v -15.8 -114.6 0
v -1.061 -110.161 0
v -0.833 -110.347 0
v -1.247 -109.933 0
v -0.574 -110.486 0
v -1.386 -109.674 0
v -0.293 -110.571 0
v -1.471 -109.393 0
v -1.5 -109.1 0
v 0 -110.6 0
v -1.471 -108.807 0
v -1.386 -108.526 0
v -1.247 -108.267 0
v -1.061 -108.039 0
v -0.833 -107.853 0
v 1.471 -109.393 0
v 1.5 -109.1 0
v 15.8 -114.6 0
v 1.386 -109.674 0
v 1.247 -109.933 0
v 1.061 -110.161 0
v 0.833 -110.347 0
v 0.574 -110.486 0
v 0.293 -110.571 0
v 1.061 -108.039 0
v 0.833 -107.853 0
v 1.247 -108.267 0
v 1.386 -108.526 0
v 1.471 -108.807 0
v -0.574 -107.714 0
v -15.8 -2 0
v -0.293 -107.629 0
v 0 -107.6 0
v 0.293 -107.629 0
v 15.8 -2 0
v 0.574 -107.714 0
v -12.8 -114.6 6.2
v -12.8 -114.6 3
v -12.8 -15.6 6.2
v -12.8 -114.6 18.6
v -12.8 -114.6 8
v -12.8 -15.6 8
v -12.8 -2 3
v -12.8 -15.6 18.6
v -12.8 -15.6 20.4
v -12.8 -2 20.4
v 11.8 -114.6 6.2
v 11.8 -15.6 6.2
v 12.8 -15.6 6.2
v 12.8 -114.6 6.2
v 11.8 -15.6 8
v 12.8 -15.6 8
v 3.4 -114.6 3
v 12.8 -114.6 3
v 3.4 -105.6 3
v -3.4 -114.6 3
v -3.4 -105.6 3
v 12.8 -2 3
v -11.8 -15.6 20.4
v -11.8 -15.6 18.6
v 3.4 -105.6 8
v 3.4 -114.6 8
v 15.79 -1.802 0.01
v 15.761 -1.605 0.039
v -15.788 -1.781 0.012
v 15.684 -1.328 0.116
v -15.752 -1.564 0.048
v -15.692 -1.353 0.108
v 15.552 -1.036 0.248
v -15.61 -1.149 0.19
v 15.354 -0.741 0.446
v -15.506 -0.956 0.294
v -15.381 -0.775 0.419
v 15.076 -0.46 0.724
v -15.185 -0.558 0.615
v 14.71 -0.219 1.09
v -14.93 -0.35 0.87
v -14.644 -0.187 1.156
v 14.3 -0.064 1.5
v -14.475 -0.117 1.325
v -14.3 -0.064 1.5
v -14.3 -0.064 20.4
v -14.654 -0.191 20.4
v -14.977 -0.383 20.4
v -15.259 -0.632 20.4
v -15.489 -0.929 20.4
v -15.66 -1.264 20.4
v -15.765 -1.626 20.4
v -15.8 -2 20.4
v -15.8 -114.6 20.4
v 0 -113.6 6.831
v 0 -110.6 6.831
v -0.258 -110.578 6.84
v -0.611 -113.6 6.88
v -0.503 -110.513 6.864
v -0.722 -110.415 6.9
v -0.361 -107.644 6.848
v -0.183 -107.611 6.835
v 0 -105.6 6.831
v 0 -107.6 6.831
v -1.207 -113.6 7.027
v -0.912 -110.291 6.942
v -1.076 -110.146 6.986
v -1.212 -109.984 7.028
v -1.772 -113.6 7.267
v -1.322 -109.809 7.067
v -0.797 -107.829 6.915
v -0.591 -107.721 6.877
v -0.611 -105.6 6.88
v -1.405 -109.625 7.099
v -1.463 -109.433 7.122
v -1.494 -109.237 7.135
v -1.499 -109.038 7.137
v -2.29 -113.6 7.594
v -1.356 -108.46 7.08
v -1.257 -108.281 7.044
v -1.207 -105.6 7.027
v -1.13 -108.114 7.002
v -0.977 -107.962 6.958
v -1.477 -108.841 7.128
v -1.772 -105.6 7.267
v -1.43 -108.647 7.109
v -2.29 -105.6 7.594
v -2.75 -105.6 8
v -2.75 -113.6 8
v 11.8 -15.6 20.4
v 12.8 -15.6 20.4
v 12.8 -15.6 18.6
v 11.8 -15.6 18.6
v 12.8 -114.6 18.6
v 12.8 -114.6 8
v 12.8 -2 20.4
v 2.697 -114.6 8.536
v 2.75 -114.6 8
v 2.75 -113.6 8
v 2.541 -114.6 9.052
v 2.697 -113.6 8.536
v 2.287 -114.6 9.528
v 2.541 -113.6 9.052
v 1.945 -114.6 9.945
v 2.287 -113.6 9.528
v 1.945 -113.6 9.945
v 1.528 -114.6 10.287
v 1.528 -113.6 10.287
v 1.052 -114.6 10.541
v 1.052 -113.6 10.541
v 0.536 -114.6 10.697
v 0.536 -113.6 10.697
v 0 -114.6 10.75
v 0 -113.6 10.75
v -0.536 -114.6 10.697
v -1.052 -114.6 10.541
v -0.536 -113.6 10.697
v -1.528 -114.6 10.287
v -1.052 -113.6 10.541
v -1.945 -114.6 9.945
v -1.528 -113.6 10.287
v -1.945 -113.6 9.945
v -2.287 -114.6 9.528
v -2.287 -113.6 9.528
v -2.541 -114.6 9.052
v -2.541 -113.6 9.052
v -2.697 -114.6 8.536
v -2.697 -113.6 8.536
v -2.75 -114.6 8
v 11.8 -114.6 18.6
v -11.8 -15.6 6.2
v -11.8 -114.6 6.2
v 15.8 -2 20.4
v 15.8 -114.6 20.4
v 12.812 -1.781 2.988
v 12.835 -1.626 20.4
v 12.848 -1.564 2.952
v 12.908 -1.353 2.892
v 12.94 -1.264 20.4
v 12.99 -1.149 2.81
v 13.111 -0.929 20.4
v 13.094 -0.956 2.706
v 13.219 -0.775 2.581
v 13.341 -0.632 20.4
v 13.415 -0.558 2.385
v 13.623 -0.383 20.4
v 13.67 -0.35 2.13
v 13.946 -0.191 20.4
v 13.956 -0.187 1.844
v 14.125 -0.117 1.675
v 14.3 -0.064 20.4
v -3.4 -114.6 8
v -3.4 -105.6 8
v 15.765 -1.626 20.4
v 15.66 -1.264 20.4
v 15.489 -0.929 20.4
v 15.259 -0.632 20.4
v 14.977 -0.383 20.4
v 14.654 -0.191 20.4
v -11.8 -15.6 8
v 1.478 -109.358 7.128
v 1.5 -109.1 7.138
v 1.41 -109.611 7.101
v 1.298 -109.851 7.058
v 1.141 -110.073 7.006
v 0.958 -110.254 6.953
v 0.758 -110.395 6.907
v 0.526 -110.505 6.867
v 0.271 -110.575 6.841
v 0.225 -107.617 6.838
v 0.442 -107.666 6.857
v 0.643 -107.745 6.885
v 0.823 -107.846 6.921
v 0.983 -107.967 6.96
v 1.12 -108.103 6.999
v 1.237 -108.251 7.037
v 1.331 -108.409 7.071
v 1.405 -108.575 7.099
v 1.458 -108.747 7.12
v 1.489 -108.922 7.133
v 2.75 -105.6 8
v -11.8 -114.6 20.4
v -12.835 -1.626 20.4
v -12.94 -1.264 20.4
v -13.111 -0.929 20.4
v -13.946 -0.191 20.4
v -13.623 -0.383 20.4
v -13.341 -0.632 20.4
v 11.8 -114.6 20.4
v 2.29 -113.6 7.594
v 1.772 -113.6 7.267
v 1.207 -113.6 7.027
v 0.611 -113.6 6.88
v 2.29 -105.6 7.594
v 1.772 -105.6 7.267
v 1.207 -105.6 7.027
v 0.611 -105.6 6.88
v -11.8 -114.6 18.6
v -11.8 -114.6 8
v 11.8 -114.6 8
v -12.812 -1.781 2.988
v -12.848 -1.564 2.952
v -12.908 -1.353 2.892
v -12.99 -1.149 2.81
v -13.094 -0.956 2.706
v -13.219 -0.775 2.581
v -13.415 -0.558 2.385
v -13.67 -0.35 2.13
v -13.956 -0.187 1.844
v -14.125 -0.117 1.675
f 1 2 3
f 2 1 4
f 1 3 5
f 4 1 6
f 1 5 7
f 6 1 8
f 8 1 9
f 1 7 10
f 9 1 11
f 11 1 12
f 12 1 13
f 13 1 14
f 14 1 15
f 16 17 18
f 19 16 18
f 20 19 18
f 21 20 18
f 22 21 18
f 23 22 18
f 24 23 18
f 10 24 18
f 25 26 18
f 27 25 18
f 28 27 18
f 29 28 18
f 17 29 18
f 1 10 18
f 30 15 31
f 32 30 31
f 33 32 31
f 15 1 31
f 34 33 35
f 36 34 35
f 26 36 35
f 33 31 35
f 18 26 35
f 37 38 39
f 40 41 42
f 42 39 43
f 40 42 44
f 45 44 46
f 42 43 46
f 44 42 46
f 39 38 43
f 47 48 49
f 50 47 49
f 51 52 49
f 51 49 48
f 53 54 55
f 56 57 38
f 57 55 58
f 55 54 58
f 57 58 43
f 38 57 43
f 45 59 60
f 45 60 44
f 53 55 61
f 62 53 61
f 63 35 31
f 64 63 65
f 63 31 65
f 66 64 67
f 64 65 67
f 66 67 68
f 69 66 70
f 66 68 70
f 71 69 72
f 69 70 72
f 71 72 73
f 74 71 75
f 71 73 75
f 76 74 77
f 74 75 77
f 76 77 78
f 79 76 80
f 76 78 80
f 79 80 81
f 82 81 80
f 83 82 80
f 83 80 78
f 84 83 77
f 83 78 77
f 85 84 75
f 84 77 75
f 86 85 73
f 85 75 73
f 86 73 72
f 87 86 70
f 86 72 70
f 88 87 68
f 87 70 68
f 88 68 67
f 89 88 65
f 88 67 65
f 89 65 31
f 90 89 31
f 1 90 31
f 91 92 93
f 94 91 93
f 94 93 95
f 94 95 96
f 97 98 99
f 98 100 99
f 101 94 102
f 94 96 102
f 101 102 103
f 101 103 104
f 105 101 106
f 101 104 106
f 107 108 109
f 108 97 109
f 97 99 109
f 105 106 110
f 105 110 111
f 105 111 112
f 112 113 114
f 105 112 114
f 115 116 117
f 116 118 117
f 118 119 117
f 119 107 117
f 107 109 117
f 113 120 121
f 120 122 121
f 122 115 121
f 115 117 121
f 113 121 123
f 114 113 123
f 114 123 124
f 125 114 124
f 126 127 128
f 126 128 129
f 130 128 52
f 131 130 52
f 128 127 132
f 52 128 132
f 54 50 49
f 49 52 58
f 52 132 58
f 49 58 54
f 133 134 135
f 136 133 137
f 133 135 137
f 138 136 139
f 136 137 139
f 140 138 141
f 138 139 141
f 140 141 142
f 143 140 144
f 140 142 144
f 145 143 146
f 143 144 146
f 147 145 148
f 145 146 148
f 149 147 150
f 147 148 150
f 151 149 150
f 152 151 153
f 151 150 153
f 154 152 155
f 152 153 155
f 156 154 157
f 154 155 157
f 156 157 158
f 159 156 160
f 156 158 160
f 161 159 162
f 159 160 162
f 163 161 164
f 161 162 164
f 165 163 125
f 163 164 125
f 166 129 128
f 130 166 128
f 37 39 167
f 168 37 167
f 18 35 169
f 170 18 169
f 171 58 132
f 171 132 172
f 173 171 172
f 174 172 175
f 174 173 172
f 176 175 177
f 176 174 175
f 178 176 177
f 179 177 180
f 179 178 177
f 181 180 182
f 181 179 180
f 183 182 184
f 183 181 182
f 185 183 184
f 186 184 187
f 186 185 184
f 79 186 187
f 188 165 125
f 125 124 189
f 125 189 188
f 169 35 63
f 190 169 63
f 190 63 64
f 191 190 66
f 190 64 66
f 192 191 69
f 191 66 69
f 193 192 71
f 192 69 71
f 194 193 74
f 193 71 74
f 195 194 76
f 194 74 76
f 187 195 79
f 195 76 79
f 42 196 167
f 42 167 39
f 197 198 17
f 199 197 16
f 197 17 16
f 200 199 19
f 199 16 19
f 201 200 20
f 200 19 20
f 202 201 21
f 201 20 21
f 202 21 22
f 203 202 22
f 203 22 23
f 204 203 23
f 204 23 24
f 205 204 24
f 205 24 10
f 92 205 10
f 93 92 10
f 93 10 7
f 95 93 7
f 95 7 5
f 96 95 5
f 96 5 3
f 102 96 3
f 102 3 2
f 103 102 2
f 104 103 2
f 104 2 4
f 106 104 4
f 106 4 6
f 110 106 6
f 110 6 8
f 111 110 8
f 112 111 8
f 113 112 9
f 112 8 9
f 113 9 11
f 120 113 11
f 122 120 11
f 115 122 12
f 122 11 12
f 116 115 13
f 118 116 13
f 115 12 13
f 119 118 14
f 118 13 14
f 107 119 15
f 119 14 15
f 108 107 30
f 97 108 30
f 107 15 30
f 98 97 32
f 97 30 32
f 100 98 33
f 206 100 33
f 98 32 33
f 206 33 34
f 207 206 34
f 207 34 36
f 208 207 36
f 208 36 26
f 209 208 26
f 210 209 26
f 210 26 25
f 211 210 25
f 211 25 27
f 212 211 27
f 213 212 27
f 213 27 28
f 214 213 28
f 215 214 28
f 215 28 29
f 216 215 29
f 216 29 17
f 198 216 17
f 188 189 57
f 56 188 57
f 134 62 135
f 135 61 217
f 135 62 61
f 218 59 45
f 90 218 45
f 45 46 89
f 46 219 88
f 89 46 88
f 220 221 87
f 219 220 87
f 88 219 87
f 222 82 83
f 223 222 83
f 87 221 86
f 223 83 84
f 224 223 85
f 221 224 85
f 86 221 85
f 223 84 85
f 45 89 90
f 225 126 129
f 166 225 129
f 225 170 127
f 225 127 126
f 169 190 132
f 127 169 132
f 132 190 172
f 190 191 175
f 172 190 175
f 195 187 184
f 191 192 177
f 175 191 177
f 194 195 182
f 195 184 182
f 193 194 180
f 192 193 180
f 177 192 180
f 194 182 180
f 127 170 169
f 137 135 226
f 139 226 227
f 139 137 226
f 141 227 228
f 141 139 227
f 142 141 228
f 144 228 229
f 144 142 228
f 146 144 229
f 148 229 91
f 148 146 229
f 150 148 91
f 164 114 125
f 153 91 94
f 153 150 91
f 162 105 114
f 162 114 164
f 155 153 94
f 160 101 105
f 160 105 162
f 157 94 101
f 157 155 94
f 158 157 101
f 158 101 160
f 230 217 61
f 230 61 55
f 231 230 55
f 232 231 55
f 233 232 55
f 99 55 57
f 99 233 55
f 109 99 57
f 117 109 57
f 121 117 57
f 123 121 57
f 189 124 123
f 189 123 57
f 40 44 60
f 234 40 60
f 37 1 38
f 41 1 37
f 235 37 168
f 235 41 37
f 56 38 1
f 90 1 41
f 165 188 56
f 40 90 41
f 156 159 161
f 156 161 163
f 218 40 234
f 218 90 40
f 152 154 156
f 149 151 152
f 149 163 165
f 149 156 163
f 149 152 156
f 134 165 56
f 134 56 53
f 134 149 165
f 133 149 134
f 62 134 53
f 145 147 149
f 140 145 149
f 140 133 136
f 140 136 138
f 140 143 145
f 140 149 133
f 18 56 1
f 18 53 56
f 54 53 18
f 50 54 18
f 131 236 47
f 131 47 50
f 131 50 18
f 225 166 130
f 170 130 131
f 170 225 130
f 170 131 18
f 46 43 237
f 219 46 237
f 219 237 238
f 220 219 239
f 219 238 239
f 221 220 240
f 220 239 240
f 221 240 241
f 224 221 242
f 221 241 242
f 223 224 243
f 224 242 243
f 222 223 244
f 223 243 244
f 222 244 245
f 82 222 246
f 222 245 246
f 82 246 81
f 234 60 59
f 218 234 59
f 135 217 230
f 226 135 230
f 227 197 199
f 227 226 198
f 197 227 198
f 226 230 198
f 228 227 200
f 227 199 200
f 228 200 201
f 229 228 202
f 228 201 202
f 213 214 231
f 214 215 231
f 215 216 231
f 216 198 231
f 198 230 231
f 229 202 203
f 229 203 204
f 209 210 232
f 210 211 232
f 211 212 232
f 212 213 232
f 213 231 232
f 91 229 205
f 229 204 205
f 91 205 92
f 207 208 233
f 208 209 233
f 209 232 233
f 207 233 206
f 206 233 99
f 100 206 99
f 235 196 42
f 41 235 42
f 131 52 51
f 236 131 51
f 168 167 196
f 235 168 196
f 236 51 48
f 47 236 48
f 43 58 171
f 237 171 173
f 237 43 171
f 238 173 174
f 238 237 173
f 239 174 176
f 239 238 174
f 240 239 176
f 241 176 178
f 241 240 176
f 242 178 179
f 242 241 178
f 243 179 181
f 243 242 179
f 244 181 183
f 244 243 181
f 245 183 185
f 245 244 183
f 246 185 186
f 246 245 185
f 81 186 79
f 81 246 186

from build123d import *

# Parameters (mm, degrees)
F1_DEPTH      = 114.6
F3_DEPTH      = 105.6
F5_DEPTH      = 8
F6_R          = 1.5
F7_DEPTH      = 20.401
F8_W          = 1
F8_H          = 1.8
F9_DEPTH      = 15.6
F10_T1_DEPTH  = 22.4
F10_T3_DEPTH  = 30.4
F10_T5_DEPTH  = 25.6
F10_T7_DEPTH  = 41.6
F10_T13_DEPTH = 30.6
F10_T17_DEPTH = 27.4
F10_T24_DEPTH = 30.6
F10_T28_DEPTH = 27.4


# Not quite as in the source:
# - a fillet or chamfer that OpenCascade refuses, or shapes differently, is made with other operations: its cross-section is extruded or revolved along the edge and cut away or added


with BuildPart() as f1:
    # F0 (on Front) → F1 (new body)
    with BuildSketch(Plane.XZ):
        Polygon((-15.8, 0), (0, 0), (15.8, 0), (15.8, 20.4), (11.8, 20.4), (11.8, 18.6), (12.8, 18.6), (12.8, 8), (11.8, 8), (11.8, 6.2), (12.8, 6.2), (12.8, 3), (3.4, 3), (3.4, 8), (2.75, 8), (0, 8), (-2.75, 8), (-3.4, 8), (-3.4, 3), (-12.8, 3), (-12.8, 6.2), (-11.8, 6.2), (-11.8, 8), (-12.8, 8), (-12.8, 18.6), (-11.8, 18.6), (-11.8, 20.4), (-15.8, 20.4), align=None)
        with BuildLine():
            ThreePointArc((0, 10.75), (-1.9445436483, 9.9445436483), (-2.75, 8))
            Line((-2.75, 8), (0, 8))
            Line((0, 8), (0, 10.75))
        make_face()
        with BuildLine():
            Line((0, 8), (2.75, 8))
            ThreePointArc((2.75, 8), (1.9445436483, 9.9445436483), (0, 10.75))
            Line((0, 10.75), (0, 8))
        make_face()
    extrude(amount=F1_DEPTH)

    # F2 (on face) → F3 (cut)
    with BuildSketch(Plane(origin=(0, 0, 0), x_dir=(-1, 0, 0), z_dir=(0, 1, 0))):
        with BuildLine():
            Line((-3.4, 8), (-3.4, 3))
            Line((-3.4, 3), (3.4, 3))
            Line((3.4, 3), (3.4, 8))
            Line((3.4, 8), (2.75, 8))
            ThreePointArc((2.75, 8), (0, 10.75), (-2.75, 8))
            Line((-2.75, 8), (-3.4, 8))
        make_face()
    extrude(amount=-F3_DEPTH, mode=Mode.SUBTRACT)

    # F4 (on face) → F5 (cut)
    with BuildSketch(Plane(origin=(0, -105.6, 0), x_dir=(-1, 0, 0), z_dir=(0, 1, 0))):
        with BuildLine():
            ThreePointArc((2.75, 8), (0, 10.75), (-2.75, 8))
            ThreePointArc((-2.75, 8), (-1.4940831044, 7.1353558864), (0, 6.8309673695))
            ThreePointArc((0, 6.8309673695), (1.4940831044, 7.1353558864), (2.75, 8))
        make_face()
    extrude(amount=-F5_DEPTH, mode=Mode.SUBTRACT)

    # F6 (on face) → F7 (cut, through all)
    with BuildSketch(Plane(origin=(0, 0, 0), x_dir=(1, 0, 0), z_dir=(0, 0, -1))):
        with Locations((0, 109.1)):
            Circle(F6_R)
    extrude(amount=-F7_DEPTH, mode=Mode.SUBTRACT)

    # F8 (on face) → F9 (cut)
    with BuildSketch(Plane(origin=(0, 0, 0), x_dir=(-1, 0, 0), z_dir=(0, 1, 0))):
        with Locations((-12.3, 19.5)):
            Rectangle(F8_W, F8_H)
        with Locations((-12.3, 7.1)):
            Rectangle(F8_W, F8_H)
        with Locations((12.3, 7.1)):
            Rectangle(F8_W, F8_H)
        with Locations((12.3, 19.5)):
            Rectangle(F8_W, F8_H)
    extrude(amount=-F9_DEPTH, mode=Mode.SUBTRACT)

    # F10: fillet of radius 2 on 6 edges, made by hand

    # F10_s2 → F10_t1 (cut)
    with BuildSketch(Plane.XY.offset(3)):
        with BuildLine():
            ThreePointArc((12.8, -2), (13.3857864376, -0.5857864376), (14.8, 0))
            Line((14.8, 0), (12.8, 0))
            Line((12.8, 0), (12.8, -2))
        make_face()
        with BuildLine():
            ThreePointArc((-12.8, -2), (-13.3857864376, -0.5857864376), (-14.8, 0))
            Line((-14.8, 0), (-12.8, 0))
            Line((-12.8, 0), (-12.8, -2))
        make_face()
    extrude(amount=F10_T1_DEPTH, mode=Mode.SUBTRACT)

    # F10_s4 → F10_t3 (cut)
    with BuildSketch(Plane.XY.offset(-5)):
        with BuildLine():
            ThreePointArc((15.8, -2), (15.2142135624, -0.5857864376), (13.8, 0))
            Line((13.8, 0), (15.8, 0))
            Line((15.8, 0), (15.8, -2))
        make_face()
        with BuildLine():
            ThreePointArc((-13.8, 0), (-15.2142135624, -0.5857864376), (-15.8, -2))
            Line((-15.8, -2), (-15.8, 0))
            Line((-15.8, 0), (-13.8, 0))
        make_face()
    extrude(amount=F10_T3_DEPTH, mode=Mode.SUBTRACT)

    # F10_s6 → F10_t5 (cut)
    with BuildSketch(Plane.YZ.offset(-12.8)):
        with BuildLine():
            ThreePointArc((-2, 3), (-0.5857864376, 2.4142135624), (0, 1))
            Line((0, 1), (0, 3))
            Line((0, 3), (-2, 3))
        make_face()
    extrude(amount=F10_T5_DEPTH, mode=Mode.SUBTRACT)

    # F10_s8 → F10_t7 (cut)
    with BuildSketch(Plane.YZ.offset(-20.8)):
        with BuildLine():
            ThreePointArc((-2, 0), (-0.5857864376, 0.5857864376), (0, 2))
            Line((0, 2), (0, 0))
            Line((0, 0), (-2, 0))
        make_face()
    extrude(amount=F10_T7_DEPTH, mode=Mode.SUBTRACT)


with BuildPart() as f10_tool11:
    # F10_s12 → F10_t13 (new body)
    with BuildSketch(Plane.YZ.offset(-12.8)):
        with BuildLine():
            ThreePointArc((-2, 3), (-0.5857864376, 2.4142135624), (0, 1))
            Line((0, 1), (0, 3))
            Line((0, 3), (-2, 3))
        make_face()
    extrude(amount=F10_T13_DEPTH)

    split(bisect_by=Plane.YZ.offset(12.8), keep=Keep.TOP)


with BuildPart() as f10_tool15:
    # F10_s16 → F10_t17 (new body)
    with BuildSketch(Plane.XY.offset(-2)):
        with BuildLine():
            ThreePointArc((12.8, -2), (13.3857864376, -0.5857864376), (14.8, 0))
            Line((14.8, 0), (12.8, 0))
            Line((12.8, 0), (12.8, -2))
        make_face()
    extrude(amount=F10_T17_DEPTH)

    split(bisect_by=Plane.XY.offset(3), keep=Keep.BOTTOM)


with BuildPart() as f10_tool11_1:
    add(f10_tool11.part)

    # F10_t19: intersect F10_tool15
    add(f10_tool15.part, mode=Mode.INTERSECT)


with BuildPart() as f1_1:
    add(f1.part)

    # F10_t9: cut F10_tool11
    add(f10_tool11_1.part, mode=Mode.SUBTRACT)


with BuildPart() as f10_tool22:
    # F10_s23 → F10_t24 (new body)
    with BuildSketch(Plane.YZ.offset(-17.8)):
        with BuildLine():
            ThreePointArc((-2, 3), (-0.5857864376, 2.4142135624), (0, 1))
            Line((0, 1), (0, 3))
            Line((0, 3), (-2, 3))
        make_face()
    extrude(amount=F10_T24_DEPTH)

    split(bisect_by=Plane.YZ.offset(-12.8), keep=Keep.BOTTOM)


with BuildPart() as f10_tool26:
    # F10_s27 → F10_t28 (new body)
    with BuildSketch(Plane.XY.offset(25.4)):
        with BuildLine():
            ThreePointArc((-12.8, -2), (-13.3857864376, -0.5857864376), (-14.8, 0))
            Line((-14.8, 0), (-12.8, 0))
            Line((-12.8, 0), (-12.8, -2))
        make_face()
    extrude(amount=-F10_T28_DEPTH)

    split(bisect_by=Plane.XY.offset(3), keep=Keep.BOTTOM)


with BuildPart() as f10_tool22_1:
    add(f10_tool22.part)

    # F10_t30: intersect F10_tool26
    add(f10_tool26.part, mode=Mode.INTERSECT)


with BuildPart() as f1_2:
    add(f1_1.part)

    # F10_t20: cut F10_tool22
    add(f10_tool22_1.part, mode=Mode.SUBTRACT)


solid = f1_2.part
